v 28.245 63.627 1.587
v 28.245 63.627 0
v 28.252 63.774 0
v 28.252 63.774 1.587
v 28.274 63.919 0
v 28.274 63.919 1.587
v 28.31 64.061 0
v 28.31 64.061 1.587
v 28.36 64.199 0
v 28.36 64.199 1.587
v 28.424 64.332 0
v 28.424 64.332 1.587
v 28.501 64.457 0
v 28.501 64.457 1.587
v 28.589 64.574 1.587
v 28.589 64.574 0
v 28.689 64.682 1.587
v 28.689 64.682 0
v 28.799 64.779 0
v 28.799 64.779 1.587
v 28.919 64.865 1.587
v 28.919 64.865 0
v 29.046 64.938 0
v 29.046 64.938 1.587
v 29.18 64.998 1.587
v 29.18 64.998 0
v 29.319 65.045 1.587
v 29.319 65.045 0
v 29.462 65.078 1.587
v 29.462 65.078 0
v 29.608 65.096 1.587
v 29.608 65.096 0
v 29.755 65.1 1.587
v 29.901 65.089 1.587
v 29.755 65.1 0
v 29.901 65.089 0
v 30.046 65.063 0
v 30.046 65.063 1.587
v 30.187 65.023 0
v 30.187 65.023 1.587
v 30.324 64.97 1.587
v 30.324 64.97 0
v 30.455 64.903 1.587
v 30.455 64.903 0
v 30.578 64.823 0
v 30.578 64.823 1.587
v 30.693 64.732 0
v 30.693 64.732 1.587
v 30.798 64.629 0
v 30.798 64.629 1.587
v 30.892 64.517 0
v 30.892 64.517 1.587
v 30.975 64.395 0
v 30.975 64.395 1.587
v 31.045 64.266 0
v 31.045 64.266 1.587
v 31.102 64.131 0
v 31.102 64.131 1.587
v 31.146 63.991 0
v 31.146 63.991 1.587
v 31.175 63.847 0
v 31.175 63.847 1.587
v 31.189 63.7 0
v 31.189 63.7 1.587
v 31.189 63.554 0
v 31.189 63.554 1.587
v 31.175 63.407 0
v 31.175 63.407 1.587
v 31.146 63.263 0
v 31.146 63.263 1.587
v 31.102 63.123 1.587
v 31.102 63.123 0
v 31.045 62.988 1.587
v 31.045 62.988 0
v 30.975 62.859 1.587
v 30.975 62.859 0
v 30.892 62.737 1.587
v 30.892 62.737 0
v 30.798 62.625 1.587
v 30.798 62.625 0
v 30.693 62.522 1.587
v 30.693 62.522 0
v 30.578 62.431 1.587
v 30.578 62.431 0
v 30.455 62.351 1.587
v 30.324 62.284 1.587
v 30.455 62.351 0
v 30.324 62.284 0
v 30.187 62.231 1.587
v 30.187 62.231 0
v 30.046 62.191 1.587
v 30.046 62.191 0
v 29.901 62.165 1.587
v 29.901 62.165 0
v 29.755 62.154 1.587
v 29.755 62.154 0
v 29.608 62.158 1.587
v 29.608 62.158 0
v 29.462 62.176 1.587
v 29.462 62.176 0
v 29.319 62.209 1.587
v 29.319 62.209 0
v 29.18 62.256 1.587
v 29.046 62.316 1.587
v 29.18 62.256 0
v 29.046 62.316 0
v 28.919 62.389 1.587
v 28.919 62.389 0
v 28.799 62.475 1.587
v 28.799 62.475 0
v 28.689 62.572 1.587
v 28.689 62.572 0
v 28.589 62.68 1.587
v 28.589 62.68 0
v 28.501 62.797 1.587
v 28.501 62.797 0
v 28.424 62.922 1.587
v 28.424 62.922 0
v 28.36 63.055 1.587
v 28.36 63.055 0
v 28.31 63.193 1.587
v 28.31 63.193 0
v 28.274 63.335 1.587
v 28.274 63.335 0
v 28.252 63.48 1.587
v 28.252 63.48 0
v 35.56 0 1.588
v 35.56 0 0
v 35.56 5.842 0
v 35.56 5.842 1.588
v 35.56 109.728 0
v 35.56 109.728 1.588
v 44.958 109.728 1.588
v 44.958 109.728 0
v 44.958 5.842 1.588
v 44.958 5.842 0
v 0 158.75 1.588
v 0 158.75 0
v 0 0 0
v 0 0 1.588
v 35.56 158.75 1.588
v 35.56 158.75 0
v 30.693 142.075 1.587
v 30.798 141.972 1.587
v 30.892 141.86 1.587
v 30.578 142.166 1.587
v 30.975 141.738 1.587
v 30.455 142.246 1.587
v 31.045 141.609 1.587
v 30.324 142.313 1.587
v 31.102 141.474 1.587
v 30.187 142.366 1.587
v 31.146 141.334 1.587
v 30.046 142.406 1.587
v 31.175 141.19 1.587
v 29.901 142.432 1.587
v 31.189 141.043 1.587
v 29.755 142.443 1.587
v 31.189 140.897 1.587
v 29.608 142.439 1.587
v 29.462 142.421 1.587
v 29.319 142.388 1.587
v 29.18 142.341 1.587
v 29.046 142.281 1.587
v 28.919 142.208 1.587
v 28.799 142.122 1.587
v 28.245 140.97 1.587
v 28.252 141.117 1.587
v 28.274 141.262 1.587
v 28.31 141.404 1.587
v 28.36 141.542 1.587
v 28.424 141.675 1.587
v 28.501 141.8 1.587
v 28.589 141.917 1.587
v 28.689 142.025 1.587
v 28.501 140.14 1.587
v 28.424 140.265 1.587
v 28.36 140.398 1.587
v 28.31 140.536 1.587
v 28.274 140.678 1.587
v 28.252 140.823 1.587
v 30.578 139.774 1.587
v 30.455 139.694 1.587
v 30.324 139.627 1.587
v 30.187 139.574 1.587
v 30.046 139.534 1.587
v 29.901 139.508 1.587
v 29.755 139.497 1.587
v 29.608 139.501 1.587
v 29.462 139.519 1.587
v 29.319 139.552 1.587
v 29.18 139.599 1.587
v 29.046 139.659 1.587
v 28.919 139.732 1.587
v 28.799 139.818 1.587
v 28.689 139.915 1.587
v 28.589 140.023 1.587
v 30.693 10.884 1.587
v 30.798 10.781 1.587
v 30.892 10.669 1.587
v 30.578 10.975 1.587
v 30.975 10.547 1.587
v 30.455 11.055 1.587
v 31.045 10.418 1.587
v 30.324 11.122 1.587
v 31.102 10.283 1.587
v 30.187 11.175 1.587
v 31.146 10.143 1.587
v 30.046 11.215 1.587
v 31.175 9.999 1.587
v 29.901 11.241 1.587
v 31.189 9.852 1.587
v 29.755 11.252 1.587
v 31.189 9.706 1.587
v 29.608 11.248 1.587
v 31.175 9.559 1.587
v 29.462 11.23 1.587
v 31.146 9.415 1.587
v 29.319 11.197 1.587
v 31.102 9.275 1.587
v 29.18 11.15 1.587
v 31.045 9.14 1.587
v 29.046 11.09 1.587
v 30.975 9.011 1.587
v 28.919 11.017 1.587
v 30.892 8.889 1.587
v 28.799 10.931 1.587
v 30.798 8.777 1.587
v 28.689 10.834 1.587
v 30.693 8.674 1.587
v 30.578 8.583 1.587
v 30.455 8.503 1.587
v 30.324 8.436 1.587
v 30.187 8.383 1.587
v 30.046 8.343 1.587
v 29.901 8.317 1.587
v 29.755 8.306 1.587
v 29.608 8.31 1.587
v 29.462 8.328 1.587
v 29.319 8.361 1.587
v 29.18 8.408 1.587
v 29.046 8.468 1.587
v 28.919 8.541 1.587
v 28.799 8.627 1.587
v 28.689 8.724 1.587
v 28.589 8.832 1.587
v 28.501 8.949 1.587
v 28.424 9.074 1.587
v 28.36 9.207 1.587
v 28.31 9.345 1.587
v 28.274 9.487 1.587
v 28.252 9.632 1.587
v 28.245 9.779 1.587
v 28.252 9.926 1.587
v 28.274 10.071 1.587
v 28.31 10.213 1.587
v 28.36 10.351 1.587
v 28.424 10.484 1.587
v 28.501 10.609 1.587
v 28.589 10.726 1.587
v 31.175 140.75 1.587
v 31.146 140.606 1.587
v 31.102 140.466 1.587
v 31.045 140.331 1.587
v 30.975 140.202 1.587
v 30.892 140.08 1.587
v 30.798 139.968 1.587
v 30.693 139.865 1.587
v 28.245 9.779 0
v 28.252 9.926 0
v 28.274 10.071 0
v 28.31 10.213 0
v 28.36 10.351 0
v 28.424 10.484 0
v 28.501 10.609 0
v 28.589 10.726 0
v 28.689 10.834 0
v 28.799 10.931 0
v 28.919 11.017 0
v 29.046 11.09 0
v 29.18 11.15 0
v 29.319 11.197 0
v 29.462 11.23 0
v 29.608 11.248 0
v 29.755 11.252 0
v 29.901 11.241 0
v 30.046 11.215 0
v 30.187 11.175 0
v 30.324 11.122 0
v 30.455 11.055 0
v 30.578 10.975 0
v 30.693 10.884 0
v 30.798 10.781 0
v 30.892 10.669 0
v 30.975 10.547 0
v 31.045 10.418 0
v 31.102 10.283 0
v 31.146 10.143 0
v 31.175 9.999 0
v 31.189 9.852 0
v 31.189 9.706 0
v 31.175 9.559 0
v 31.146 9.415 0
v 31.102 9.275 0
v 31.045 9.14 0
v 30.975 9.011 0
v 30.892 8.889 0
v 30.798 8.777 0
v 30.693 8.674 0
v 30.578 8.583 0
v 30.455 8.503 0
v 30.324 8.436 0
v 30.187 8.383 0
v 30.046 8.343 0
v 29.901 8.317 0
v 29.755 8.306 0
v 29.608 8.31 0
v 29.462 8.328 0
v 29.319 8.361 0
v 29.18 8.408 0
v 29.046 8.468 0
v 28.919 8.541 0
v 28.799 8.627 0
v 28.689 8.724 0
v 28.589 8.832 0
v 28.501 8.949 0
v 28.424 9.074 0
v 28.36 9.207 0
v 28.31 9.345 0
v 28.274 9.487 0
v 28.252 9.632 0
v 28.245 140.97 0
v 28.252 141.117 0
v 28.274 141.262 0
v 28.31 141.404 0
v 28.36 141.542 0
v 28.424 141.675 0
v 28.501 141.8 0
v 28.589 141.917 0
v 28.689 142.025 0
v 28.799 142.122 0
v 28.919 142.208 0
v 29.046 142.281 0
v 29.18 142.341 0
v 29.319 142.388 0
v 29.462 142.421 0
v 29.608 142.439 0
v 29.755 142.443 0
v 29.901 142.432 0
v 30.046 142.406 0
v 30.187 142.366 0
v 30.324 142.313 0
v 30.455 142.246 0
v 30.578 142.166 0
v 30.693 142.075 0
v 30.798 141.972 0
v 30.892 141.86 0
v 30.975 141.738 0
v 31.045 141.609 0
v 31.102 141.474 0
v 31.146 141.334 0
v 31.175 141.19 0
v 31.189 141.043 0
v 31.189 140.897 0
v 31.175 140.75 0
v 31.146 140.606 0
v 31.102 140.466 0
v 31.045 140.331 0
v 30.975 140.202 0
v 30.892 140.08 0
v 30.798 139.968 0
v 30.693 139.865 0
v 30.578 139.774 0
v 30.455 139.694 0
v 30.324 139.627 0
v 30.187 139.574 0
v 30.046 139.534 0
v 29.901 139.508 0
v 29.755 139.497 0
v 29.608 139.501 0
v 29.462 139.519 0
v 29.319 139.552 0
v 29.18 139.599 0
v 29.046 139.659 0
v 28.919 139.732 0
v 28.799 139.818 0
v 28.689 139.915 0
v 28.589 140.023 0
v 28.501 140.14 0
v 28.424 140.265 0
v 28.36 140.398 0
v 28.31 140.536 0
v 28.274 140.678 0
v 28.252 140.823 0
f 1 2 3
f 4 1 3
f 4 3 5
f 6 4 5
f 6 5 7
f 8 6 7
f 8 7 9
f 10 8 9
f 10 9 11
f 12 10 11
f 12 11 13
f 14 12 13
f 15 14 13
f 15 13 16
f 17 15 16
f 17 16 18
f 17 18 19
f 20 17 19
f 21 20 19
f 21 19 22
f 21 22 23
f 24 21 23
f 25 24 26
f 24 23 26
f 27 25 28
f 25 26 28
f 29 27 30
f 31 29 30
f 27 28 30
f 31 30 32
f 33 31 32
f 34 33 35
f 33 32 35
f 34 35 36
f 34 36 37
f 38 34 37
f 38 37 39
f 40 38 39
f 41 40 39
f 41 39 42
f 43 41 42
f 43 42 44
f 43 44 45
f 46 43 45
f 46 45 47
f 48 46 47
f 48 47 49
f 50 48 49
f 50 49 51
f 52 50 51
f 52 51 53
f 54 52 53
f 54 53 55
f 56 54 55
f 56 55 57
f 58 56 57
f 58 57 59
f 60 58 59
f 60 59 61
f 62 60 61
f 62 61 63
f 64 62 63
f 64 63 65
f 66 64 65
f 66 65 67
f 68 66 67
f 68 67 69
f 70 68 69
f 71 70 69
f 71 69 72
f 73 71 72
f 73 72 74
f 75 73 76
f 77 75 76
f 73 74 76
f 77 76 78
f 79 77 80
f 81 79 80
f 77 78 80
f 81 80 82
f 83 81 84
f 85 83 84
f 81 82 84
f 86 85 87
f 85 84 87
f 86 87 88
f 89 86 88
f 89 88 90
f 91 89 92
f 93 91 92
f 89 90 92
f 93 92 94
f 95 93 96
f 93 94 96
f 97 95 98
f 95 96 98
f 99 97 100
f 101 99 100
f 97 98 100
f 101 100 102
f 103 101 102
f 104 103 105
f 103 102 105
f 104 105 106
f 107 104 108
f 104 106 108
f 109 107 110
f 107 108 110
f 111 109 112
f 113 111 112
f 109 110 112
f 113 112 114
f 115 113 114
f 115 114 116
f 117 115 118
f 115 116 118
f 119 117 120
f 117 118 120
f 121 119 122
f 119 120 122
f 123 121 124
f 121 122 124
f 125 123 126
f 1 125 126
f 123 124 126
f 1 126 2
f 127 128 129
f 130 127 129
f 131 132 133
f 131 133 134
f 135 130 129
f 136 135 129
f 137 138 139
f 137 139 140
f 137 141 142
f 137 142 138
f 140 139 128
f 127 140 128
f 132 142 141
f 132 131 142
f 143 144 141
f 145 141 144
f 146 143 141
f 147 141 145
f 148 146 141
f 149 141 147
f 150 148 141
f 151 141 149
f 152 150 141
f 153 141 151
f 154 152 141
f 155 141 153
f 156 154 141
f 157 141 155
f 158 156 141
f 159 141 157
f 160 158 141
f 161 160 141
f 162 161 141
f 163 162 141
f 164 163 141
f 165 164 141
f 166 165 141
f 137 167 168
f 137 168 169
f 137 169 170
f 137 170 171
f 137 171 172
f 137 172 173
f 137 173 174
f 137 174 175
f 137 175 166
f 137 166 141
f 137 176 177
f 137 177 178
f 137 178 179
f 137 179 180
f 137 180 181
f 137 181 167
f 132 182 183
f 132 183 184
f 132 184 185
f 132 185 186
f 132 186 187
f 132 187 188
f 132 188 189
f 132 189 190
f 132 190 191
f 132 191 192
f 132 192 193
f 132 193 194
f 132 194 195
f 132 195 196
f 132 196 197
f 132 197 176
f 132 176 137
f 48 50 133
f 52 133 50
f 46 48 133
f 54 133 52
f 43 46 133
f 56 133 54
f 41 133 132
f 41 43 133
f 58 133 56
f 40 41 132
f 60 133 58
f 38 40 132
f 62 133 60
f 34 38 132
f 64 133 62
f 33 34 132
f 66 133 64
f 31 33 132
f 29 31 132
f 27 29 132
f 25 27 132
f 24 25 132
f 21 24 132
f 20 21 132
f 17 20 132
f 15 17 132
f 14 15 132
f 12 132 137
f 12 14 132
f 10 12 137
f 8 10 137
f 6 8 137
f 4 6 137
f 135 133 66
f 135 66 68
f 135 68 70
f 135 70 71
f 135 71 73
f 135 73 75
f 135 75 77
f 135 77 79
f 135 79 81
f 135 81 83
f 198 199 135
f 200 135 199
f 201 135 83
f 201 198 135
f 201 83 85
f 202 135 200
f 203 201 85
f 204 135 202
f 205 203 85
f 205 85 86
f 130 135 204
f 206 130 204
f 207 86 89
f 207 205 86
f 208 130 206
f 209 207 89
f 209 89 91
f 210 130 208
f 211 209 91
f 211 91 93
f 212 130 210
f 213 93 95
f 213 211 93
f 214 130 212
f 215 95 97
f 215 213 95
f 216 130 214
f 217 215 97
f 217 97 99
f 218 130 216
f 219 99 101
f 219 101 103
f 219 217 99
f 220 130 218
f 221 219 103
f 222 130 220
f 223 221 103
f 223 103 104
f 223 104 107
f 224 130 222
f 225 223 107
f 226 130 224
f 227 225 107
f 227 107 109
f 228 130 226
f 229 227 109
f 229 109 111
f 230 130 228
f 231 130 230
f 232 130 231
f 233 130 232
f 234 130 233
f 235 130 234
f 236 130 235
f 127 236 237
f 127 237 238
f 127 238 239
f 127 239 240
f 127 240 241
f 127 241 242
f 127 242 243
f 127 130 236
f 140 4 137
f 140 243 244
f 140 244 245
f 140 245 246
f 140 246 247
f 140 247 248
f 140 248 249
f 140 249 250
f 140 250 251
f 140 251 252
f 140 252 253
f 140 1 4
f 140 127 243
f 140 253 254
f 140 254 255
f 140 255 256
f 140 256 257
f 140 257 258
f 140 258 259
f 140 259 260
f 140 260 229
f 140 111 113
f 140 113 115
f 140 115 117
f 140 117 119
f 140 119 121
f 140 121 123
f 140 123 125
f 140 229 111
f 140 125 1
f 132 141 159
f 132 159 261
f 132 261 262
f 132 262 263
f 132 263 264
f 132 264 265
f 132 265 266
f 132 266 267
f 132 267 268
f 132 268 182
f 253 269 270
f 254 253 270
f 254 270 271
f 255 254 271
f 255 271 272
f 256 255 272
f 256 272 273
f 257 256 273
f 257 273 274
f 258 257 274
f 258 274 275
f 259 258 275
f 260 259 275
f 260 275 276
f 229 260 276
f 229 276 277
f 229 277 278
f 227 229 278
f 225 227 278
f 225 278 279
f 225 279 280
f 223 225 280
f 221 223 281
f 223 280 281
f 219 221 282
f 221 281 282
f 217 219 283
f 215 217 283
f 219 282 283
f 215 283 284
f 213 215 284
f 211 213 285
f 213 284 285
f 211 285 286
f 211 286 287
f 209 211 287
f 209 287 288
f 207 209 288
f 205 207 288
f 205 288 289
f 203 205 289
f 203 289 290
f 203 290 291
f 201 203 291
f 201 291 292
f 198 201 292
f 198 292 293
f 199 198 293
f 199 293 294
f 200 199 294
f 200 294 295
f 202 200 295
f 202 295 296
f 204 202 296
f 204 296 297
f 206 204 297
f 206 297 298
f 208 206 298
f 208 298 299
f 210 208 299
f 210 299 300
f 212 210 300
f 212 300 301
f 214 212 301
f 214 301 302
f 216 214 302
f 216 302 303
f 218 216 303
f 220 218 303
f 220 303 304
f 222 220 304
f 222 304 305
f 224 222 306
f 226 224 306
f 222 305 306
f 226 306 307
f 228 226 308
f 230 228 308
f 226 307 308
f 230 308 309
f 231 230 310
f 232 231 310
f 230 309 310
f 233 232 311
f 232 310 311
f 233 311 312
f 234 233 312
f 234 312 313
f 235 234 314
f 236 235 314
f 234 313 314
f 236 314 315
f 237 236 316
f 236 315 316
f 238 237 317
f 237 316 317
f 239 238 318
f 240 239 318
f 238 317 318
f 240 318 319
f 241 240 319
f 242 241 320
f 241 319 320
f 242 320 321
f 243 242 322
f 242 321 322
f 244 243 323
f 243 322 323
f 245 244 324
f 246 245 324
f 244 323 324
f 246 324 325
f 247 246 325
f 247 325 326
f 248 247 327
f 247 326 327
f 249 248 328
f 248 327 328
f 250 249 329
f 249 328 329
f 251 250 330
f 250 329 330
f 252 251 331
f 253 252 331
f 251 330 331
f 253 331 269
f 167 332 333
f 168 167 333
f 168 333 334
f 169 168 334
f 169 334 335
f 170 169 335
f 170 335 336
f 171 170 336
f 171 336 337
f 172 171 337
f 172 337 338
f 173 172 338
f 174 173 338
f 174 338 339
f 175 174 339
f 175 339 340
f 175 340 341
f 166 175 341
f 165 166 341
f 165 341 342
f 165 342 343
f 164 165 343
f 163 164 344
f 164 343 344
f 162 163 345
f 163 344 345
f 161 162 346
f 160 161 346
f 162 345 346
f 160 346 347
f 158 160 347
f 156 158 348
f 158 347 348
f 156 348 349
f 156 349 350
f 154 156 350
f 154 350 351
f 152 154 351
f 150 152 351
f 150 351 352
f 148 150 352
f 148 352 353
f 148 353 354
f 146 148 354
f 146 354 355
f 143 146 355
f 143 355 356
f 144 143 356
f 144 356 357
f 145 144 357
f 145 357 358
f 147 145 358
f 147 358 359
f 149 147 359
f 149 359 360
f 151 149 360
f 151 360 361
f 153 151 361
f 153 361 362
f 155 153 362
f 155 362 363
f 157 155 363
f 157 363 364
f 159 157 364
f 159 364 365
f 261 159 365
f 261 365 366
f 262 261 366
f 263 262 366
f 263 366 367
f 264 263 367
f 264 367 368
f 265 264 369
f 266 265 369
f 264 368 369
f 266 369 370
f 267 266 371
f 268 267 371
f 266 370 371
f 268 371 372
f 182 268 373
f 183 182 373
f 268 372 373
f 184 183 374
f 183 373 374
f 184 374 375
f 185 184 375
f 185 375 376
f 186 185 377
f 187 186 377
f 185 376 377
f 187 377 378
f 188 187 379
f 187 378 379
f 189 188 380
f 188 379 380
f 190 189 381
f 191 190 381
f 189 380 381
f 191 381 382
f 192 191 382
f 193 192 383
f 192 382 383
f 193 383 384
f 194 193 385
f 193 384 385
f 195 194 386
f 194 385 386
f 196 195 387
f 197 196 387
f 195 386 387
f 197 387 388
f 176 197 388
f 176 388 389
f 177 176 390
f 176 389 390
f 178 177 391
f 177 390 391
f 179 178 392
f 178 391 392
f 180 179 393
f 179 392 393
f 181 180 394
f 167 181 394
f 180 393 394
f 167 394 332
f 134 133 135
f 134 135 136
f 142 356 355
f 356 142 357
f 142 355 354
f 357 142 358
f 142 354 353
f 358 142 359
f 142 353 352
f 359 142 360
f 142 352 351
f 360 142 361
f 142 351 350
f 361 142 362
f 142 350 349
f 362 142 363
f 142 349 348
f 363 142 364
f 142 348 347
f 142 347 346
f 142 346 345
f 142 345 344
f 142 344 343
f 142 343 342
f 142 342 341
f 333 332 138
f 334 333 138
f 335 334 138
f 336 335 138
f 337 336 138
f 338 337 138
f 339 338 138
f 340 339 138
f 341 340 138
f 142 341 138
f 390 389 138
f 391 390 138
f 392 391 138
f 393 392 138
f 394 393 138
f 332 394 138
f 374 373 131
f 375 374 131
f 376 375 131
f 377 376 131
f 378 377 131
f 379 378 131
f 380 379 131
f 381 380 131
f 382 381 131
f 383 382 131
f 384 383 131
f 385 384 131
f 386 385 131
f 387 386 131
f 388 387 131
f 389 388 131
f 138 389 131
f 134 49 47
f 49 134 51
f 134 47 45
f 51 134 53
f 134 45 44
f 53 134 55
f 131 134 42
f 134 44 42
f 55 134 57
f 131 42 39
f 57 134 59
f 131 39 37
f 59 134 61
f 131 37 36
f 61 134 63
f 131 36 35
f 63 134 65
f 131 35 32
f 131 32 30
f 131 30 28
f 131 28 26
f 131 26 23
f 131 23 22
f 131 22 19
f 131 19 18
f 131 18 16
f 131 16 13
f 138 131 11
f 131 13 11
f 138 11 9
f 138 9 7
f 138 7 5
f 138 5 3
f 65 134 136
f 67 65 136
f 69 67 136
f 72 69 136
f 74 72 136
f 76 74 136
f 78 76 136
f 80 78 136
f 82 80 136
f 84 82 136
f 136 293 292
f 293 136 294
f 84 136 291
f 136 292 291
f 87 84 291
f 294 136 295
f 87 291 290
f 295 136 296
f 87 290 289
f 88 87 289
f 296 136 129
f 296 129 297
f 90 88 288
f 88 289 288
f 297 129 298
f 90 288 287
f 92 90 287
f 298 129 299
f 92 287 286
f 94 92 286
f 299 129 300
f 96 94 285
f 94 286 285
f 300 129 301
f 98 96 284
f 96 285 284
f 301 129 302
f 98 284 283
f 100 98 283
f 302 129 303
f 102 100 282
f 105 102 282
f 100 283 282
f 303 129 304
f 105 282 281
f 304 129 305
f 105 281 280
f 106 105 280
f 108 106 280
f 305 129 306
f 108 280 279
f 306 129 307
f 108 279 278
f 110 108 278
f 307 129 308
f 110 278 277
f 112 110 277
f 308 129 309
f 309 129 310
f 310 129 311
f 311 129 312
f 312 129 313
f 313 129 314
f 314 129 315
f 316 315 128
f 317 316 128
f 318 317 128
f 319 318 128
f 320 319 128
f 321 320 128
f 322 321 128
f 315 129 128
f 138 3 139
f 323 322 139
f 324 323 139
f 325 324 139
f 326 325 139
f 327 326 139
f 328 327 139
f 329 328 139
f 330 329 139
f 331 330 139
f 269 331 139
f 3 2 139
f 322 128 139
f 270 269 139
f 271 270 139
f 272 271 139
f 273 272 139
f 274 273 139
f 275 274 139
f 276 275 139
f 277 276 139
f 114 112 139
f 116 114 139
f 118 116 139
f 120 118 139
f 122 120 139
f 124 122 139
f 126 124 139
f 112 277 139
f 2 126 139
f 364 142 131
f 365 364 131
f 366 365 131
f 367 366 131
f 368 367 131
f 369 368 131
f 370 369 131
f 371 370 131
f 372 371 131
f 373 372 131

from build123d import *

# Parameters (mm, degrees)
SKETCH1_W                          = 35.56
SKETCH1_H                          = 146.05
EXTRUDE1_DEPTH                     = 1.5875
SKETCH3_W                          = 1.5875
SKETCH3_H                          = 103.886
EXTRUDE2_DEPTH                     = 9.398
F_32_0_116000_DIAMETER_HOLE1_D     = 2.9464
F_32_0_116000_DIAMETER_HOLE1_DEPTH = 25.4
F_32_0_116000_DIAMETER_HOLE1_TIP   = 0.885187864
SKETCH7_W                          = 35.56
SKETCH7_H                          = 1.5875
EXTRUDE3_DEPTH                     = 12.7


with BuildPart() as part:
    # Sketch1 → Extrude1 (new body)
    with BuildSketch(Plane.XY):
        with Locations((17.78, 73.025)):
            Rectangle(SKETCH1_W, SKETCH1_H)
    extrude(amount=EXTRUDE1_DEPTH)

    # Sketch3 → Extrude2 (add)
    with BuildSketch(Plane(origin=(35.56, 0, 0), x_dir=(0, 0, -1), z_dir=(1, 0, 0))):
        with Locations((-0.79375, 57.785)):
            Rectangle(SKETCH3_W, SKETCH3_H)
    extrude(amount=EXTRUDE2_DEPTH)

    # #32 (0.116000) Diameter Hole1
    with Locations(Plane(origin=(29.718, 9.779, 1.5875), x_dir=(1, 0, 0), z_dir=(0, 0, 1))):
        with Locations((0, 0), (0, 53.848), (0, 131.191)):
            Hole(F_32_0_116000_DIAMETER_HOLE1_D / 2, depth=F_32_0_116000_DIAMETER_HOLE1_DEPTH)
            with Locations((0, 0, -(F_32_0_116000_DIAMETER_HOLE1_DEPTH + F_32_0_116000_DIAMETER_HOLE1_TIP / 2))):  # 118° drill point
                Cone(0, F_32_0_116000_DIAMETER_HOLE1_D / 2, F_32_0_116000_DIAMETER_HOLE1_TIP, mode=Mode.SUBTRACT)

    # Sketch7 → Extrude3 (add)
    with BuildSketch(Plane(origin=(0, 146.05, 0), x_dir=(-1, 0, 0), z_dir=(0, 1, 0))):
        with Locations((-17.78, 0.79375)):
            Rectangle(SKETCH7_W, SKETCH7_H)
    extrude(amount=EXTRUDE3_DEPTH)


solid = part.part
